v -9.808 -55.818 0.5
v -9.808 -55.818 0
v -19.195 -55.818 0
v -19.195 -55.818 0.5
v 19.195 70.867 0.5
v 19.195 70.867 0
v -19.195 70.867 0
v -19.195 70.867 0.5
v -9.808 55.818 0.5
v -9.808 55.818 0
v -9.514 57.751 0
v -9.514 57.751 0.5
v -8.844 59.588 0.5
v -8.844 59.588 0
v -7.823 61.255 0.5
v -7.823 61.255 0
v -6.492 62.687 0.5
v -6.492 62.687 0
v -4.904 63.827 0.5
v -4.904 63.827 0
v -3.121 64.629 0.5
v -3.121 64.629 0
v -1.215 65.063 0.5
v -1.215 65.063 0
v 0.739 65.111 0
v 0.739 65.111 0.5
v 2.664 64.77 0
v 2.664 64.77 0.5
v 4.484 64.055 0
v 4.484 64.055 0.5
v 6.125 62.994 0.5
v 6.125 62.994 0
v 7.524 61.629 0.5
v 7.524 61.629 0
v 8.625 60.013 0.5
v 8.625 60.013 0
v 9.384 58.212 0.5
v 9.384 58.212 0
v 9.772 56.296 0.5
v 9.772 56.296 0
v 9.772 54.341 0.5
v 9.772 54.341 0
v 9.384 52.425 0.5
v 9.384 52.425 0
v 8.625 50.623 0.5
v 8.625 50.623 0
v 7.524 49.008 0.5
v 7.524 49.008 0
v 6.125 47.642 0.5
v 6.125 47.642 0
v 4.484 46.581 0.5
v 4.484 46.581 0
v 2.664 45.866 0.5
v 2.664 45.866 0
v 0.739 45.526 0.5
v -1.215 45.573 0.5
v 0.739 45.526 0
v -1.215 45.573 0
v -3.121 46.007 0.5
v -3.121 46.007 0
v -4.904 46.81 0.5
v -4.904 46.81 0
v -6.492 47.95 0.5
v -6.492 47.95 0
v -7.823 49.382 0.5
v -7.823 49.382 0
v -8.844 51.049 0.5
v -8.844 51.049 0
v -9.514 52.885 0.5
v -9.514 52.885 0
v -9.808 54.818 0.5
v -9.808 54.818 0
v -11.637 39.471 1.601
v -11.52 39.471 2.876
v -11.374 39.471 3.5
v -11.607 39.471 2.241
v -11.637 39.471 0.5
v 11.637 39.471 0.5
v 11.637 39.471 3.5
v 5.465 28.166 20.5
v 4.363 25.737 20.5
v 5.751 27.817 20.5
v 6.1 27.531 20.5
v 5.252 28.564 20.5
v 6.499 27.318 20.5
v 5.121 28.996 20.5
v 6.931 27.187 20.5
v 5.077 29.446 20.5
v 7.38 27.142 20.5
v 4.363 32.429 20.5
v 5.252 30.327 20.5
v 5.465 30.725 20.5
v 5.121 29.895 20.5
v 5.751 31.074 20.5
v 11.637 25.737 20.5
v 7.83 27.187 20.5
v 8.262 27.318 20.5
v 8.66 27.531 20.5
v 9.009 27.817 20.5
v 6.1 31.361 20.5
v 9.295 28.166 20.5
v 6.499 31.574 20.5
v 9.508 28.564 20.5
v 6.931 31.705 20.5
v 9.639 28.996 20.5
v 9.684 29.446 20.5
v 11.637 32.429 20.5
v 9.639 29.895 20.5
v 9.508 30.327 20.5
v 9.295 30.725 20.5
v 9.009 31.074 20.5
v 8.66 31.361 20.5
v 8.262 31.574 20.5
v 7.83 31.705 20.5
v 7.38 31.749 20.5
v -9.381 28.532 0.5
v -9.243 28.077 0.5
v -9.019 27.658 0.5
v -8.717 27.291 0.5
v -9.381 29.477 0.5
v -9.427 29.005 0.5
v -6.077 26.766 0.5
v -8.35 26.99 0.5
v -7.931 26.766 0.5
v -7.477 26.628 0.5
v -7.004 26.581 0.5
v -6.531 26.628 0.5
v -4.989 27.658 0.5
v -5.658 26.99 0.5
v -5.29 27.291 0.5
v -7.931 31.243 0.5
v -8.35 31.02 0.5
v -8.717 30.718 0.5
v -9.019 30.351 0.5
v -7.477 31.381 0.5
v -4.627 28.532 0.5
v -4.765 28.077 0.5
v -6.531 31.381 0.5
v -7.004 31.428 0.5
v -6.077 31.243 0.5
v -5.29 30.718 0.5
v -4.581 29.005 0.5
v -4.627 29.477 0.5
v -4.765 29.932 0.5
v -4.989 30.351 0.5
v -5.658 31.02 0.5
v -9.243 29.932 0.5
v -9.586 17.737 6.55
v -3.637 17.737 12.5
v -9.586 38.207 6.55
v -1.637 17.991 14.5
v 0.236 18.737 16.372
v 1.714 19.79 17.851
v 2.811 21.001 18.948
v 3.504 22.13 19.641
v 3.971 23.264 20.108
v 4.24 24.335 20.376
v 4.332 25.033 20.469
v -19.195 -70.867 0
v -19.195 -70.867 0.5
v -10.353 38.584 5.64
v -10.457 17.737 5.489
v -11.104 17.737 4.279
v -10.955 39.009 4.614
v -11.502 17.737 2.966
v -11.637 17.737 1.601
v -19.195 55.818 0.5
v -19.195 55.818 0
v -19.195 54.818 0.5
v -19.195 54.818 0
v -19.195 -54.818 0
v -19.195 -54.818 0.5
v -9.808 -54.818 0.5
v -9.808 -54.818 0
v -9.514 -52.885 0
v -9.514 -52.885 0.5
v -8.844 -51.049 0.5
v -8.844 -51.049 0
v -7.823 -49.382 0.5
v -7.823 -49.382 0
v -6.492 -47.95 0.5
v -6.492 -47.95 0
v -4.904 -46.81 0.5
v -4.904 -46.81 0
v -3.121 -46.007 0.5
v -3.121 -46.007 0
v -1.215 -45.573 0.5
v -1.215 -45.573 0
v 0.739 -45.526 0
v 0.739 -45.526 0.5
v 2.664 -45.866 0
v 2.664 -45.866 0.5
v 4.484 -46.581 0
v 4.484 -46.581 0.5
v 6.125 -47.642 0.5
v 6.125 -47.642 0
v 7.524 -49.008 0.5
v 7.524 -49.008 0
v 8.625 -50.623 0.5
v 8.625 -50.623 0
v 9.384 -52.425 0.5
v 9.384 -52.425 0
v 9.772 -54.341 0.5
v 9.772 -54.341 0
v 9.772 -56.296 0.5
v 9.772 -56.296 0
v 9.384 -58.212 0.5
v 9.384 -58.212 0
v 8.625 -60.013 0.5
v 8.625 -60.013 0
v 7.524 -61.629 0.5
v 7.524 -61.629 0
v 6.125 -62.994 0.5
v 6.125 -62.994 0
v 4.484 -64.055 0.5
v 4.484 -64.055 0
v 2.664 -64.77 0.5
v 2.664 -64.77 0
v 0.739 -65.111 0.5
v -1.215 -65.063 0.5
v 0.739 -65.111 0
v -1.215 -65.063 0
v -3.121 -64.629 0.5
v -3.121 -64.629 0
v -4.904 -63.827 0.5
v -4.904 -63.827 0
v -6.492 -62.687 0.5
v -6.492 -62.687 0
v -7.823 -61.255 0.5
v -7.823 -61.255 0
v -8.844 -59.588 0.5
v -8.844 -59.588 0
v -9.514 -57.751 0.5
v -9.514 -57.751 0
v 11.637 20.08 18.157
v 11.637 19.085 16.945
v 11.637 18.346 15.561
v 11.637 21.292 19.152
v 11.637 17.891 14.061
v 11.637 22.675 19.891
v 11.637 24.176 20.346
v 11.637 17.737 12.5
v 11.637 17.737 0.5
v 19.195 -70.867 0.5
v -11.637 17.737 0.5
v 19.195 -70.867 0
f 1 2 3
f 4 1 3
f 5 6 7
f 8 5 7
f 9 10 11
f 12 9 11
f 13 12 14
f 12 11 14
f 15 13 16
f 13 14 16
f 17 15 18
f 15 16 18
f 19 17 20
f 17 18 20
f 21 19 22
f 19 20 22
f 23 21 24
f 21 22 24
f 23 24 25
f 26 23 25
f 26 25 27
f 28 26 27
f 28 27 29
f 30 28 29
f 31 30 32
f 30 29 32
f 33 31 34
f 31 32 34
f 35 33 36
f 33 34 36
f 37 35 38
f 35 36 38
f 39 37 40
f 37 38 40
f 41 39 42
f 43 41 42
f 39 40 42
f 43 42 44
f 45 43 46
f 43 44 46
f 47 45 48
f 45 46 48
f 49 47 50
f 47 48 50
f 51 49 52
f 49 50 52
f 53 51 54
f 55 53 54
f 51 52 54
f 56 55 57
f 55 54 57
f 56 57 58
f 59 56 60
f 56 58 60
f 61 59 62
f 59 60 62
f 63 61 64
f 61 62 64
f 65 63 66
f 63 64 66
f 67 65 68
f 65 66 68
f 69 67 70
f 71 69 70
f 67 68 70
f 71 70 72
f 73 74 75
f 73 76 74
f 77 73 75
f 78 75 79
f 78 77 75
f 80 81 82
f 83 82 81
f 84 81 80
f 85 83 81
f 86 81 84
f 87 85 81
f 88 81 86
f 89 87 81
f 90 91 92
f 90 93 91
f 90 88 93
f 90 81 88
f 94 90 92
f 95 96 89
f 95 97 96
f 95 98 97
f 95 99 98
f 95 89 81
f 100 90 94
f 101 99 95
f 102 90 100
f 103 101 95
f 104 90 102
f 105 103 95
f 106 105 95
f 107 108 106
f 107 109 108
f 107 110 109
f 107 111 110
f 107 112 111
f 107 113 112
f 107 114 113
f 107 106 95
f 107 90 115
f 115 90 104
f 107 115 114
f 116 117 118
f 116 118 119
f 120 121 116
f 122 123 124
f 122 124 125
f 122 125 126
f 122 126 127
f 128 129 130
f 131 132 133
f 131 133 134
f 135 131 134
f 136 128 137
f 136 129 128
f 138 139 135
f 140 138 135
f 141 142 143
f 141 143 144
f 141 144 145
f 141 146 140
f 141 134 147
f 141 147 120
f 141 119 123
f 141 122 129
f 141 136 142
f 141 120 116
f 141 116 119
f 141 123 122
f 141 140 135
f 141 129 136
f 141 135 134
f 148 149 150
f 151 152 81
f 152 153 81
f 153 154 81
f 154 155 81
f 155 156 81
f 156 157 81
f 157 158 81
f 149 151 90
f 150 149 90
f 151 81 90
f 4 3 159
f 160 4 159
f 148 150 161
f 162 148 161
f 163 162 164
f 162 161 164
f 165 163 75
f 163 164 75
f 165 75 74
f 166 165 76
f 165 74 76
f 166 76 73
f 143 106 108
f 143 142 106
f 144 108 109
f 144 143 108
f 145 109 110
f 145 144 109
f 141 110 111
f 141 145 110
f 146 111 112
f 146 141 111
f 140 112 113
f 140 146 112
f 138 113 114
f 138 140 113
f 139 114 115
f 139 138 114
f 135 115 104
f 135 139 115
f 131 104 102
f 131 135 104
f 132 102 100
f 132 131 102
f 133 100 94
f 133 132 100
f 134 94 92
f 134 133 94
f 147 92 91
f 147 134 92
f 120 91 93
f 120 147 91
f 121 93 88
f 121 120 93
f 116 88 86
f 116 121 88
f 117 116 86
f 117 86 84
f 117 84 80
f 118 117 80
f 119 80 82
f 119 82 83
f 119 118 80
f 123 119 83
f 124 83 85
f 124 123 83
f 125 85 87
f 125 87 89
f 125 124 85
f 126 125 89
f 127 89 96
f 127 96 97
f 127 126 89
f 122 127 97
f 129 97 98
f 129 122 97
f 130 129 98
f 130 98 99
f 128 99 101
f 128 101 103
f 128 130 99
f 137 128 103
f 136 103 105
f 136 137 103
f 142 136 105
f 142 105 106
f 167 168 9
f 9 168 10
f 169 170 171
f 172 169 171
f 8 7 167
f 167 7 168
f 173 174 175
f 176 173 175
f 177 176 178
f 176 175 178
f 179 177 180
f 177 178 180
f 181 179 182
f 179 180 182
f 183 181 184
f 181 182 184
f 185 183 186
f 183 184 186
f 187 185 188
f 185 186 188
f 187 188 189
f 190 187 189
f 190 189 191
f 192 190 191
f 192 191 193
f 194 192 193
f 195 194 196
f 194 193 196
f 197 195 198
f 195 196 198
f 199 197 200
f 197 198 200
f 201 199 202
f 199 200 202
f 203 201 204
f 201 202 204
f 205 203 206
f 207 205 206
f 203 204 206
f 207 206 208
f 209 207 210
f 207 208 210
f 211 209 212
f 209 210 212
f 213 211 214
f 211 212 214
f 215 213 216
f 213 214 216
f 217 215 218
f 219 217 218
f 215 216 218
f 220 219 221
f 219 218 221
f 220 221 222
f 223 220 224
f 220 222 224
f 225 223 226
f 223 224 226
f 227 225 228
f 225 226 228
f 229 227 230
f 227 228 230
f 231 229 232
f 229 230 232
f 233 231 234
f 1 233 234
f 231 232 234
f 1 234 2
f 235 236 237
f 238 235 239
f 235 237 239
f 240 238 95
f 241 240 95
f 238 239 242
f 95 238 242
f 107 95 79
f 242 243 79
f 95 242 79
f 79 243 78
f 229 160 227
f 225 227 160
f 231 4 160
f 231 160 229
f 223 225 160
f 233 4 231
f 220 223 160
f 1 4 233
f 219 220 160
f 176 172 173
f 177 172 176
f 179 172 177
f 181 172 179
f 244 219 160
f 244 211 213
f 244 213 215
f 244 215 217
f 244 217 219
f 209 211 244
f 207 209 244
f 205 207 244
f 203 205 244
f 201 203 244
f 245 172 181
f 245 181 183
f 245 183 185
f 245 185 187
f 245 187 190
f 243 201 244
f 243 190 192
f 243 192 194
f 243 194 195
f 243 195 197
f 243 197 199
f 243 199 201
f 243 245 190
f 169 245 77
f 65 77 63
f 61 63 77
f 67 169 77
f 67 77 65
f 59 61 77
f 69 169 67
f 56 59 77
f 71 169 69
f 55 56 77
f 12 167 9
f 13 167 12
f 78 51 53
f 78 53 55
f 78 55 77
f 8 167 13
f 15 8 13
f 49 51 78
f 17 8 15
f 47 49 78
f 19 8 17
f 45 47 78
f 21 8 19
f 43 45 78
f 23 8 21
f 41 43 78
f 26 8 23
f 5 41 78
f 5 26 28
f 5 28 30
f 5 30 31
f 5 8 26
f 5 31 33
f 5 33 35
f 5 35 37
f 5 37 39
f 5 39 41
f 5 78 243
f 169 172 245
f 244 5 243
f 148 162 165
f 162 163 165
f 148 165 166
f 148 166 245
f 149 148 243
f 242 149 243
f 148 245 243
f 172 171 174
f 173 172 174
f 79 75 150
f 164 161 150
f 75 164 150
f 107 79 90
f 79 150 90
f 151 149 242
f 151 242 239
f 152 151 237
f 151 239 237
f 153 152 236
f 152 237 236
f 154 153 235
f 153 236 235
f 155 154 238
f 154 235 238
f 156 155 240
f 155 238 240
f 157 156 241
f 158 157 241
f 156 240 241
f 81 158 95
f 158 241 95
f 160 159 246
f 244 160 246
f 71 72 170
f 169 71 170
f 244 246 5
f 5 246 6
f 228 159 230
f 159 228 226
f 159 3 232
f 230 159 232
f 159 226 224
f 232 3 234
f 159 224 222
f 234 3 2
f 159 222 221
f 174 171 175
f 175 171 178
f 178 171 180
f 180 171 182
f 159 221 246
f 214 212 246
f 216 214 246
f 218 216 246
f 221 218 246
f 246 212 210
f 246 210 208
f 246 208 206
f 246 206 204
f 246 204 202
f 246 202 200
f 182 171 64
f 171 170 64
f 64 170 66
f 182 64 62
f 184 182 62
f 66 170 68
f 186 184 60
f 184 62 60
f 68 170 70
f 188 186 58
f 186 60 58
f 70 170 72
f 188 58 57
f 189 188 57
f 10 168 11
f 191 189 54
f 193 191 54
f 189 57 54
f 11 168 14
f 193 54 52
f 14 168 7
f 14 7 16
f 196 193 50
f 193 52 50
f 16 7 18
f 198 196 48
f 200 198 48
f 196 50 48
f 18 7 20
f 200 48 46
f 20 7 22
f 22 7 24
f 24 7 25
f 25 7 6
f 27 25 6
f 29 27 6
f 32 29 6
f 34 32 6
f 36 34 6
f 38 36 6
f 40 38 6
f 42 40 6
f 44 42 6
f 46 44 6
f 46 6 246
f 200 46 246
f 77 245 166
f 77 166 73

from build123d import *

# Parameters (mm, degrees)
F1_DEPTH     = 0.5
F2_W         = 23.2733339071
F2_H         = 21.7338502407
F3_DEPTH     = 20
F6_R         = 2.3033864012
F5_R         = 2.4232405009
F8_SIZE      = 16
F9_R         = 8
F10_R        = 7
F11_SIZE     = 7
F12_T1_DEPTH = 66.1267417653


# Not quite as in the source:
# - a fillet or chamfer that OpenCascade refuses, or shapes differently, is made with other operations: its cross-section is extruded or revolved along the edge and cut away or added


with BuildPart() as f1:
    # F0 (on Top) → F1 (new body)
    with BuildSketch(Plane.XY):
        with BuildLine():
            Line((19.1950201988, 70.8673447371), (-19.1950201988, 70.8673447371))
            Line((-19.1950201988, 70.8673447371), (-19.1950201988, 55.8184058152))
            Line((-19.1950201988, 55.8184058152), (-9.8077457496, 55.8184058152))
            ThreePointArc((-9.8077457496, 55.8184058152), (9.8204918965, 55.3182214499), (-9.8077457496, 54.8180370845))
            Line((-9.8077457496, 54.8180370845), (-19.1950201988, 54.8180370845))
            Line((-19.1950201988, 54.8180370845), (-19.1950201988, -54.8180370845))
            Line((-19.1950201988, -54.8180370845), (-9.8077457496, -54.8180370845))
            ThreePointArc((-9.8077457496, -54.8180370845), (9.8204918965, -55.3182214499), (-9.8077457496, -55.8184058152))
            Line((-9.8077457496, -55.8184058152), (-19.1950201988, -55.8184058152))
            Line((-19.1950201988, -55.8184058152), (-19.1950201988, -70.8673447371))
            Line((-19.1950201988, -70.8673447371), (19.1950201988, -70.8673447371))
            Line((19.1950201988, -70.8673447371), (19.1950201988, 70.8673447371))
        make_face()
    extrude(amount=F1_DEPTH)

    # F2 (on face) → F3 (join)
    with BuildSketch(Plane.XY.offset(0.5)):
        with Locations((0, 28.6038741469)):
            Rectangle(F2_W, F2_H)
    extrude(amount=F3_DEPTH)

    # F6 (on face) → F7 section 0
    with BuildSketch(Plane.XY.offset(20.5)):
        with Locations((7.3801875114, 29.4457376003)):
            Circle(F6_R)
    # F5 (on offset) → F7 section 1
    with BuildSketch(Plane.XY.offset(0.5)):
        with Locations((-7.0039108396, 29.0047153831)):
            Circle(F5_R)
    loft(mode=Mode.SUBTRACT)

    # F8
    f8_edges = [f1.edges().sort_by_distance(p)[0] for p in [
        (-11.636667, 28.603874, 20.5),
    ]]
    chamfer(f8_edges, length=F8_SIZE)

    # F9
    f9_edges = [f1.edges().sort_by_distance(p)[0] for p in [
        (8, 17.736949, 20.5),
    ]]
    fillet(f9_edges, radius=F9_R)

    # F10
    f10_edges = [f1.edges().sort_by_distance(p)[0] for p in [
        (-11.636667, 28.603874, 4.5),
    ]]
    fillet(f10_edges, radius=F10_R)

    # F11
    f11_edges = [f1.edges().sort_by_distance(p)[0] for p in [
        (8, 39.470799, 20.5),
    ]]
    chamfer(f11_edges, length=F11_SIZE)

    # F12: chamfer of 10 on 1 edges, made by hand

    # F12_s2 → F12_t1 (cut)
    with BuildSketch(Plane.YZ.offset(-28.5633708826)):
        Polygon((39.4707992673, 3.5), (32.3997314554, 20.5710678119), (39.4707992673, 13.5), align=None)
    extrude(amount=F12_T1_DEPTH, mode=Mode.SUBTRACT)


solid = f1.part
